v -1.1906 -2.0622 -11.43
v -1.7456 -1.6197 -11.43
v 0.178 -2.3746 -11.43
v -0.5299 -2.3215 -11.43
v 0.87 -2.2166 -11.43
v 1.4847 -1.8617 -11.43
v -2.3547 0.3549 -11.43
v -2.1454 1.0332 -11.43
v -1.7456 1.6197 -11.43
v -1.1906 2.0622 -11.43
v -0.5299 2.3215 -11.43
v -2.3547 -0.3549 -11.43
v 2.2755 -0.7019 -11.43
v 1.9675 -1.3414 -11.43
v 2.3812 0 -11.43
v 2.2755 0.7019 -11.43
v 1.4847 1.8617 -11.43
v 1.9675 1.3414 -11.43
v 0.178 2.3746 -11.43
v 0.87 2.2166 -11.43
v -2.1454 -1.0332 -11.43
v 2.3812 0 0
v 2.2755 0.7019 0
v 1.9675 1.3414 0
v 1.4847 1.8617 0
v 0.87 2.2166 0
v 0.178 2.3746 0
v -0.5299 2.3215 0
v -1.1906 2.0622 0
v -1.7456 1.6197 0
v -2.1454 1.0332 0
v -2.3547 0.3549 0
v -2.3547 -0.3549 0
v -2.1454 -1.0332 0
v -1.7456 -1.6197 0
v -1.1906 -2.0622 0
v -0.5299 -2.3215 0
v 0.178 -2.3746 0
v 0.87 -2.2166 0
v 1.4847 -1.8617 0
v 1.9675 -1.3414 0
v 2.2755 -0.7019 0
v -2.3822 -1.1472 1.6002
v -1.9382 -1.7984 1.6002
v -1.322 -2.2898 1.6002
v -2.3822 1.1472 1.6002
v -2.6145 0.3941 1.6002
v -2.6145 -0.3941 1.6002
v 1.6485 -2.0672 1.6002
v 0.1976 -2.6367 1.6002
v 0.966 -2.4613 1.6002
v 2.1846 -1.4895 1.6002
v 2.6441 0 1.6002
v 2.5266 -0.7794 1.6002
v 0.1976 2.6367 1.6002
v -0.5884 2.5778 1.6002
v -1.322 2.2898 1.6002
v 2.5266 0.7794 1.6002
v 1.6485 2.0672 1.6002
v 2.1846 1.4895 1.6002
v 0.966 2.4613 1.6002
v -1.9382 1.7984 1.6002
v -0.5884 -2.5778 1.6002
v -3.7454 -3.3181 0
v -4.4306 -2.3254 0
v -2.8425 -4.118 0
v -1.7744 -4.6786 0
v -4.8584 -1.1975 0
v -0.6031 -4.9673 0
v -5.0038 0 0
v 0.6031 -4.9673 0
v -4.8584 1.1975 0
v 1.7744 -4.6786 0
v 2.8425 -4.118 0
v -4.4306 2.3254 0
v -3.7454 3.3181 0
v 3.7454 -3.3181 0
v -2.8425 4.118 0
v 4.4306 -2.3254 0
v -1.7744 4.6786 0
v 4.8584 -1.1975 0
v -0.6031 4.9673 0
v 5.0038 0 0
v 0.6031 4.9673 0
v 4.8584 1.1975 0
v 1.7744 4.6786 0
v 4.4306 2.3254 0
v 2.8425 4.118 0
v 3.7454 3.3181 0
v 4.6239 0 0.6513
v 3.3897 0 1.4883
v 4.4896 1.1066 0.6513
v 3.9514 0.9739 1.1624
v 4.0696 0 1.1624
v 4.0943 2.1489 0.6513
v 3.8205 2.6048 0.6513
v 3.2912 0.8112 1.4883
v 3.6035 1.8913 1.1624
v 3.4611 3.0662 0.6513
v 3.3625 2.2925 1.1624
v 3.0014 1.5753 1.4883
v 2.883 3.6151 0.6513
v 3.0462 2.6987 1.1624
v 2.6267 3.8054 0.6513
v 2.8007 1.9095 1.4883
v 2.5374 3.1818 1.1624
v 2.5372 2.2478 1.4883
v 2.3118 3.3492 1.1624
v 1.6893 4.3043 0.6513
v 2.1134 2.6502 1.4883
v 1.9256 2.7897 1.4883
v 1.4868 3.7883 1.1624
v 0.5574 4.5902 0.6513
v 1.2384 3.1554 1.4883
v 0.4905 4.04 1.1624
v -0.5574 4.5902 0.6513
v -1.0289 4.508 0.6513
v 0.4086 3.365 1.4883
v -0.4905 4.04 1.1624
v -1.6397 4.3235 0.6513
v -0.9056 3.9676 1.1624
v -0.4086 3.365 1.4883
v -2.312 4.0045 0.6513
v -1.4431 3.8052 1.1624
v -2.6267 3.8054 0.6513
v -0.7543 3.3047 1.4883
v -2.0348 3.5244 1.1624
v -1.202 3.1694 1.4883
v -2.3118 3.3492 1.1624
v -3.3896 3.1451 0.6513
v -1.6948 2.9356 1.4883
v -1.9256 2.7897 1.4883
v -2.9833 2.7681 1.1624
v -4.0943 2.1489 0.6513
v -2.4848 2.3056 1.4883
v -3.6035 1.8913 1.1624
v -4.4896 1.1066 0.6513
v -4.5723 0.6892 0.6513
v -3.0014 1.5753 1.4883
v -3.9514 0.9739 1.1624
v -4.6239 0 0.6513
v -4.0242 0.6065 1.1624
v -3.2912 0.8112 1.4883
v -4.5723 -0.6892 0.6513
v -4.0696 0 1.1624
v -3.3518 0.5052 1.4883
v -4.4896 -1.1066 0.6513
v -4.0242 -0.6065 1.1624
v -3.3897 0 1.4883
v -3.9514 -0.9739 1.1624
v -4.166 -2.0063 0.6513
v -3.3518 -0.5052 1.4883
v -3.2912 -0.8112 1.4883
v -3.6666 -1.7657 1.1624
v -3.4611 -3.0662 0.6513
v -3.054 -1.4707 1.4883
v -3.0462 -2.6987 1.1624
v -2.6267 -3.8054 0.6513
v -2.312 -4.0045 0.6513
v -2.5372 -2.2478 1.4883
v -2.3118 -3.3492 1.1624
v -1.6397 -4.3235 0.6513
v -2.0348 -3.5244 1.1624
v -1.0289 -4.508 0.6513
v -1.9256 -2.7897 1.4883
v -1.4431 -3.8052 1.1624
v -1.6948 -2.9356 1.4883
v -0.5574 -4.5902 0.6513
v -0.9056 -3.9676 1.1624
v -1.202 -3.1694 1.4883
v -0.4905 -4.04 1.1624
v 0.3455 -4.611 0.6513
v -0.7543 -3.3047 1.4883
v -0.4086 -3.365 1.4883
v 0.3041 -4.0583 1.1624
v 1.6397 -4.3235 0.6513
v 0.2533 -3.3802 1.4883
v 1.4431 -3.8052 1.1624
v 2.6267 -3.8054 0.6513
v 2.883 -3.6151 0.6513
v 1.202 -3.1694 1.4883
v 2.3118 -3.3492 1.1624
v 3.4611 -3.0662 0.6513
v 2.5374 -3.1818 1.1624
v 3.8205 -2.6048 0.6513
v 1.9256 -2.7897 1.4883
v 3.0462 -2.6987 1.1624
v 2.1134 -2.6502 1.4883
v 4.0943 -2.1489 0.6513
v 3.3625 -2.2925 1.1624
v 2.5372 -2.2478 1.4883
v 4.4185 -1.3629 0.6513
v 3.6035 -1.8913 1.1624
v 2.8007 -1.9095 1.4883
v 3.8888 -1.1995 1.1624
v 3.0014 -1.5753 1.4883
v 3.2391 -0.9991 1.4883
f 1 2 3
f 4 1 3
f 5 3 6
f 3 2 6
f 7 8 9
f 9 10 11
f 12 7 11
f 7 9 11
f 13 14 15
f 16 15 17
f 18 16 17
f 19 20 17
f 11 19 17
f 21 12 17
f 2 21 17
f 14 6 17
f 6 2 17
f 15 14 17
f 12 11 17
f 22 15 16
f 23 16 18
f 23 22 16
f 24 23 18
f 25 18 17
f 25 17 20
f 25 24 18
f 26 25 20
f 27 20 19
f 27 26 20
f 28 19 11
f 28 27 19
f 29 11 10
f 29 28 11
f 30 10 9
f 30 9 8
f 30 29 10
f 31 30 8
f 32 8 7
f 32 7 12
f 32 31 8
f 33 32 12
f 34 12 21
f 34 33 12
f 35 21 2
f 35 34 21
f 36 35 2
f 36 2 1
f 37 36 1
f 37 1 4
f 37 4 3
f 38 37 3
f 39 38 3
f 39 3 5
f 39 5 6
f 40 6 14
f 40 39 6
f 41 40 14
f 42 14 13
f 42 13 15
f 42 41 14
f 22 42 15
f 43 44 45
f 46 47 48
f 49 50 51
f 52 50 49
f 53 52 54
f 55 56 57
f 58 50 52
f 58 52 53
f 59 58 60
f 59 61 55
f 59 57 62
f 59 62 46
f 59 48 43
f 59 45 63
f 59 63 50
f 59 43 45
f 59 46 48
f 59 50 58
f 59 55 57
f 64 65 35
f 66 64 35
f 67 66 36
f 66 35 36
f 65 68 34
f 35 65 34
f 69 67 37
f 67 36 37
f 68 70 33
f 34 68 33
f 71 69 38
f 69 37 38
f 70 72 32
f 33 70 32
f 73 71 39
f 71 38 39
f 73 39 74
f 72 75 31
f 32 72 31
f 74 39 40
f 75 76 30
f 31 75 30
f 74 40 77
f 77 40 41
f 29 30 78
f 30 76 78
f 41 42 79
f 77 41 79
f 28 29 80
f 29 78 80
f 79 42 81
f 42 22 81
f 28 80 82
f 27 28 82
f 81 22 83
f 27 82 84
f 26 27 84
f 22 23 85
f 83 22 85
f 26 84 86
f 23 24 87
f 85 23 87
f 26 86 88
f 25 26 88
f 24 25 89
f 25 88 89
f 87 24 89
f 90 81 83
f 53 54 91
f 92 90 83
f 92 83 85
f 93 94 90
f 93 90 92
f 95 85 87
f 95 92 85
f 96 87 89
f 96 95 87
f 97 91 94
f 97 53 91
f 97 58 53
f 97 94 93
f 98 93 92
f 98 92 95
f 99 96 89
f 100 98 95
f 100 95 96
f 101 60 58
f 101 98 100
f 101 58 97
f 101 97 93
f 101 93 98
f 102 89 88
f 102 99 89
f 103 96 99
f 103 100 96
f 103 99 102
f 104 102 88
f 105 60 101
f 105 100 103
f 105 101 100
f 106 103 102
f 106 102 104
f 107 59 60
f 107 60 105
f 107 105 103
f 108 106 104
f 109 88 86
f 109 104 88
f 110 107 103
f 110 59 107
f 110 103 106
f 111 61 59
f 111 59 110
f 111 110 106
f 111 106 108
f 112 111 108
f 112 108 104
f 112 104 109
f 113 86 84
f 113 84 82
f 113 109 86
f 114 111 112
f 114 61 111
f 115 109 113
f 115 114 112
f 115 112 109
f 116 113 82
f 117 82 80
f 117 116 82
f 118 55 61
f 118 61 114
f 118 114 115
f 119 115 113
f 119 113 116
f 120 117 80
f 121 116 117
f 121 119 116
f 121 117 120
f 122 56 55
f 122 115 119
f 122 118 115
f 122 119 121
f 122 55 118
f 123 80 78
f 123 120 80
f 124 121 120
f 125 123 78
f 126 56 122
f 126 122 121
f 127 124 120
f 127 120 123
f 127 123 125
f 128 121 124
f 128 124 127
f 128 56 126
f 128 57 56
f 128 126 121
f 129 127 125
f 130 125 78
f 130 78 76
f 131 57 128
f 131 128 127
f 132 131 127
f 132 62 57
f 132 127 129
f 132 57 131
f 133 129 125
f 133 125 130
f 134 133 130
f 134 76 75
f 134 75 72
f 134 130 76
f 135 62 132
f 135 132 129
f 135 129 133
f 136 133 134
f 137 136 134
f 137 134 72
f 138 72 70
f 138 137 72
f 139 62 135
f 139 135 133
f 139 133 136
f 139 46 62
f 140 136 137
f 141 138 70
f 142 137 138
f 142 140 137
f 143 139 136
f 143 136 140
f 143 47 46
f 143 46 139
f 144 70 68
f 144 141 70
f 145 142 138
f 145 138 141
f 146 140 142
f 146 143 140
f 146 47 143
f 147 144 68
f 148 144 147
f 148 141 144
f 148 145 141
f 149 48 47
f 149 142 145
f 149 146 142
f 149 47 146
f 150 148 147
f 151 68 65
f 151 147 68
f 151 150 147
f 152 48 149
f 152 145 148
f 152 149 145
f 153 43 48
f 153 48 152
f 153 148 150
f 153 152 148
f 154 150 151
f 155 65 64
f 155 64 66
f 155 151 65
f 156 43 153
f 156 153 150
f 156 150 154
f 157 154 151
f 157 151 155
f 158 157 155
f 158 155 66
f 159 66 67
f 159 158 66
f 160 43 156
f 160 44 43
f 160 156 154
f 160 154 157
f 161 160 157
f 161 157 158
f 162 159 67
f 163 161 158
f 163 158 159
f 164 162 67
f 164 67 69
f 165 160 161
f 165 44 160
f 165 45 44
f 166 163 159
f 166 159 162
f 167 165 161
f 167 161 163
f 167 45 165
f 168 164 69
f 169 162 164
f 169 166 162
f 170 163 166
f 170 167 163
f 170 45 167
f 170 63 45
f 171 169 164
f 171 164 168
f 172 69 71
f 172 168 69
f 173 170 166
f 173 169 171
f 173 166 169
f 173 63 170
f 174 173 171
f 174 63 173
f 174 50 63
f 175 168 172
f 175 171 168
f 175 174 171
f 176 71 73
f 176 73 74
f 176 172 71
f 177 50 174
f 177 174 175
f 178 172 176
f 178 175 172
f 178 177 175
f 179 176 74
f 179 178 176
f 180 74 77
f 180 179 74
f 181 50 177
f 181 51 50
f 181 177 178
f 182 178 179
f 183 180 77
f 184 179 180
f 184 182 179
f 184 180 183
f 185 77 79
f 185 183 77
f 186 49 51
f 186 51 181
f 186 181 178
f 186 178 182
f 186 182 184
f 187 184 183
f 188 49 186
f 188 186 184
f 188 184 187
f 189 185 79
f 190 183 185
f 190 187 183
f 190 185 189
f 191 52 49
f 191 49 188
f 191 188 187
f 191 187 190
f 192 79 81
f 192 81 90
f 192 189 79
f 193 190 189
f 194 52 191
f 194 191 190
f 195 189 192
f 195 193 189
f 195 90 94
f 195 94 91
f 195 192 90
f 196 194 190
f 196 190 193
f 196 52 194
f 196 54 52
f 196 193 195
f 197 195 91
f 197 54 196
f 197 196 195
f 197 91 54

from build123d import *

# Parameters (mm, degrees)
SKETCH1_R           = 5.0038
BOSS_EXTRUDE1_DEPTH = 1.6002
SKETCH2_R           = 2.38125
BOSS_EXTRUDE2_DEPTH = 11.43
FILLET1_R           = 2.54


with BuildPart() as part:
    # Sketch1 → Boss-Extrude1 (new body)
    with BuildSketch(Plane.XY):
        Circle(SKETCH1_R)
    extrude(amount=BOSS_EXTRUDE1_DEPTH)

    # Sketch2 → Boss-Extrude2 (add)
    with BuildSketch(Plane.XY):
        Circle(SKETCH2_R)
    extrude(amount=-BOSS_EXTRUDE2_DEPTH)

    # Fillet1
    # the kernel refuses this fillet: 2.54 mm, written as the material it takes off along each edge
    with BuildSketch(Plane(origin=(0, 0, 1.6002), x_dir=(1, 0, 0), z_dir=(0, -1, 0))) as fillet1_piece_1:
        with BuildLine():
            CenterArc((2.644059345, -2.54), FILLET1_R, 21.715617283, 68.284382717)
            Line((2.644059345, 0), (2.644059345, 0.0508))
            Line((2.644059345, 0.0508), (5.0038, 0.0508))
            Line((5.0038, 0.0508), (5.0546, 0))
            ThreePointArc((5.0546, 0), (5.0546, -0.8001), (5.050994813, -1.581404))
            Line((5.050994813, -1.581404), (5.0038, -1.6002))
        make_face()
    revolve(axis=Axis((0, 0, 1.6002), (0, 0, 1)), mode=Mode.SUBTRACT)


solid = part.part
